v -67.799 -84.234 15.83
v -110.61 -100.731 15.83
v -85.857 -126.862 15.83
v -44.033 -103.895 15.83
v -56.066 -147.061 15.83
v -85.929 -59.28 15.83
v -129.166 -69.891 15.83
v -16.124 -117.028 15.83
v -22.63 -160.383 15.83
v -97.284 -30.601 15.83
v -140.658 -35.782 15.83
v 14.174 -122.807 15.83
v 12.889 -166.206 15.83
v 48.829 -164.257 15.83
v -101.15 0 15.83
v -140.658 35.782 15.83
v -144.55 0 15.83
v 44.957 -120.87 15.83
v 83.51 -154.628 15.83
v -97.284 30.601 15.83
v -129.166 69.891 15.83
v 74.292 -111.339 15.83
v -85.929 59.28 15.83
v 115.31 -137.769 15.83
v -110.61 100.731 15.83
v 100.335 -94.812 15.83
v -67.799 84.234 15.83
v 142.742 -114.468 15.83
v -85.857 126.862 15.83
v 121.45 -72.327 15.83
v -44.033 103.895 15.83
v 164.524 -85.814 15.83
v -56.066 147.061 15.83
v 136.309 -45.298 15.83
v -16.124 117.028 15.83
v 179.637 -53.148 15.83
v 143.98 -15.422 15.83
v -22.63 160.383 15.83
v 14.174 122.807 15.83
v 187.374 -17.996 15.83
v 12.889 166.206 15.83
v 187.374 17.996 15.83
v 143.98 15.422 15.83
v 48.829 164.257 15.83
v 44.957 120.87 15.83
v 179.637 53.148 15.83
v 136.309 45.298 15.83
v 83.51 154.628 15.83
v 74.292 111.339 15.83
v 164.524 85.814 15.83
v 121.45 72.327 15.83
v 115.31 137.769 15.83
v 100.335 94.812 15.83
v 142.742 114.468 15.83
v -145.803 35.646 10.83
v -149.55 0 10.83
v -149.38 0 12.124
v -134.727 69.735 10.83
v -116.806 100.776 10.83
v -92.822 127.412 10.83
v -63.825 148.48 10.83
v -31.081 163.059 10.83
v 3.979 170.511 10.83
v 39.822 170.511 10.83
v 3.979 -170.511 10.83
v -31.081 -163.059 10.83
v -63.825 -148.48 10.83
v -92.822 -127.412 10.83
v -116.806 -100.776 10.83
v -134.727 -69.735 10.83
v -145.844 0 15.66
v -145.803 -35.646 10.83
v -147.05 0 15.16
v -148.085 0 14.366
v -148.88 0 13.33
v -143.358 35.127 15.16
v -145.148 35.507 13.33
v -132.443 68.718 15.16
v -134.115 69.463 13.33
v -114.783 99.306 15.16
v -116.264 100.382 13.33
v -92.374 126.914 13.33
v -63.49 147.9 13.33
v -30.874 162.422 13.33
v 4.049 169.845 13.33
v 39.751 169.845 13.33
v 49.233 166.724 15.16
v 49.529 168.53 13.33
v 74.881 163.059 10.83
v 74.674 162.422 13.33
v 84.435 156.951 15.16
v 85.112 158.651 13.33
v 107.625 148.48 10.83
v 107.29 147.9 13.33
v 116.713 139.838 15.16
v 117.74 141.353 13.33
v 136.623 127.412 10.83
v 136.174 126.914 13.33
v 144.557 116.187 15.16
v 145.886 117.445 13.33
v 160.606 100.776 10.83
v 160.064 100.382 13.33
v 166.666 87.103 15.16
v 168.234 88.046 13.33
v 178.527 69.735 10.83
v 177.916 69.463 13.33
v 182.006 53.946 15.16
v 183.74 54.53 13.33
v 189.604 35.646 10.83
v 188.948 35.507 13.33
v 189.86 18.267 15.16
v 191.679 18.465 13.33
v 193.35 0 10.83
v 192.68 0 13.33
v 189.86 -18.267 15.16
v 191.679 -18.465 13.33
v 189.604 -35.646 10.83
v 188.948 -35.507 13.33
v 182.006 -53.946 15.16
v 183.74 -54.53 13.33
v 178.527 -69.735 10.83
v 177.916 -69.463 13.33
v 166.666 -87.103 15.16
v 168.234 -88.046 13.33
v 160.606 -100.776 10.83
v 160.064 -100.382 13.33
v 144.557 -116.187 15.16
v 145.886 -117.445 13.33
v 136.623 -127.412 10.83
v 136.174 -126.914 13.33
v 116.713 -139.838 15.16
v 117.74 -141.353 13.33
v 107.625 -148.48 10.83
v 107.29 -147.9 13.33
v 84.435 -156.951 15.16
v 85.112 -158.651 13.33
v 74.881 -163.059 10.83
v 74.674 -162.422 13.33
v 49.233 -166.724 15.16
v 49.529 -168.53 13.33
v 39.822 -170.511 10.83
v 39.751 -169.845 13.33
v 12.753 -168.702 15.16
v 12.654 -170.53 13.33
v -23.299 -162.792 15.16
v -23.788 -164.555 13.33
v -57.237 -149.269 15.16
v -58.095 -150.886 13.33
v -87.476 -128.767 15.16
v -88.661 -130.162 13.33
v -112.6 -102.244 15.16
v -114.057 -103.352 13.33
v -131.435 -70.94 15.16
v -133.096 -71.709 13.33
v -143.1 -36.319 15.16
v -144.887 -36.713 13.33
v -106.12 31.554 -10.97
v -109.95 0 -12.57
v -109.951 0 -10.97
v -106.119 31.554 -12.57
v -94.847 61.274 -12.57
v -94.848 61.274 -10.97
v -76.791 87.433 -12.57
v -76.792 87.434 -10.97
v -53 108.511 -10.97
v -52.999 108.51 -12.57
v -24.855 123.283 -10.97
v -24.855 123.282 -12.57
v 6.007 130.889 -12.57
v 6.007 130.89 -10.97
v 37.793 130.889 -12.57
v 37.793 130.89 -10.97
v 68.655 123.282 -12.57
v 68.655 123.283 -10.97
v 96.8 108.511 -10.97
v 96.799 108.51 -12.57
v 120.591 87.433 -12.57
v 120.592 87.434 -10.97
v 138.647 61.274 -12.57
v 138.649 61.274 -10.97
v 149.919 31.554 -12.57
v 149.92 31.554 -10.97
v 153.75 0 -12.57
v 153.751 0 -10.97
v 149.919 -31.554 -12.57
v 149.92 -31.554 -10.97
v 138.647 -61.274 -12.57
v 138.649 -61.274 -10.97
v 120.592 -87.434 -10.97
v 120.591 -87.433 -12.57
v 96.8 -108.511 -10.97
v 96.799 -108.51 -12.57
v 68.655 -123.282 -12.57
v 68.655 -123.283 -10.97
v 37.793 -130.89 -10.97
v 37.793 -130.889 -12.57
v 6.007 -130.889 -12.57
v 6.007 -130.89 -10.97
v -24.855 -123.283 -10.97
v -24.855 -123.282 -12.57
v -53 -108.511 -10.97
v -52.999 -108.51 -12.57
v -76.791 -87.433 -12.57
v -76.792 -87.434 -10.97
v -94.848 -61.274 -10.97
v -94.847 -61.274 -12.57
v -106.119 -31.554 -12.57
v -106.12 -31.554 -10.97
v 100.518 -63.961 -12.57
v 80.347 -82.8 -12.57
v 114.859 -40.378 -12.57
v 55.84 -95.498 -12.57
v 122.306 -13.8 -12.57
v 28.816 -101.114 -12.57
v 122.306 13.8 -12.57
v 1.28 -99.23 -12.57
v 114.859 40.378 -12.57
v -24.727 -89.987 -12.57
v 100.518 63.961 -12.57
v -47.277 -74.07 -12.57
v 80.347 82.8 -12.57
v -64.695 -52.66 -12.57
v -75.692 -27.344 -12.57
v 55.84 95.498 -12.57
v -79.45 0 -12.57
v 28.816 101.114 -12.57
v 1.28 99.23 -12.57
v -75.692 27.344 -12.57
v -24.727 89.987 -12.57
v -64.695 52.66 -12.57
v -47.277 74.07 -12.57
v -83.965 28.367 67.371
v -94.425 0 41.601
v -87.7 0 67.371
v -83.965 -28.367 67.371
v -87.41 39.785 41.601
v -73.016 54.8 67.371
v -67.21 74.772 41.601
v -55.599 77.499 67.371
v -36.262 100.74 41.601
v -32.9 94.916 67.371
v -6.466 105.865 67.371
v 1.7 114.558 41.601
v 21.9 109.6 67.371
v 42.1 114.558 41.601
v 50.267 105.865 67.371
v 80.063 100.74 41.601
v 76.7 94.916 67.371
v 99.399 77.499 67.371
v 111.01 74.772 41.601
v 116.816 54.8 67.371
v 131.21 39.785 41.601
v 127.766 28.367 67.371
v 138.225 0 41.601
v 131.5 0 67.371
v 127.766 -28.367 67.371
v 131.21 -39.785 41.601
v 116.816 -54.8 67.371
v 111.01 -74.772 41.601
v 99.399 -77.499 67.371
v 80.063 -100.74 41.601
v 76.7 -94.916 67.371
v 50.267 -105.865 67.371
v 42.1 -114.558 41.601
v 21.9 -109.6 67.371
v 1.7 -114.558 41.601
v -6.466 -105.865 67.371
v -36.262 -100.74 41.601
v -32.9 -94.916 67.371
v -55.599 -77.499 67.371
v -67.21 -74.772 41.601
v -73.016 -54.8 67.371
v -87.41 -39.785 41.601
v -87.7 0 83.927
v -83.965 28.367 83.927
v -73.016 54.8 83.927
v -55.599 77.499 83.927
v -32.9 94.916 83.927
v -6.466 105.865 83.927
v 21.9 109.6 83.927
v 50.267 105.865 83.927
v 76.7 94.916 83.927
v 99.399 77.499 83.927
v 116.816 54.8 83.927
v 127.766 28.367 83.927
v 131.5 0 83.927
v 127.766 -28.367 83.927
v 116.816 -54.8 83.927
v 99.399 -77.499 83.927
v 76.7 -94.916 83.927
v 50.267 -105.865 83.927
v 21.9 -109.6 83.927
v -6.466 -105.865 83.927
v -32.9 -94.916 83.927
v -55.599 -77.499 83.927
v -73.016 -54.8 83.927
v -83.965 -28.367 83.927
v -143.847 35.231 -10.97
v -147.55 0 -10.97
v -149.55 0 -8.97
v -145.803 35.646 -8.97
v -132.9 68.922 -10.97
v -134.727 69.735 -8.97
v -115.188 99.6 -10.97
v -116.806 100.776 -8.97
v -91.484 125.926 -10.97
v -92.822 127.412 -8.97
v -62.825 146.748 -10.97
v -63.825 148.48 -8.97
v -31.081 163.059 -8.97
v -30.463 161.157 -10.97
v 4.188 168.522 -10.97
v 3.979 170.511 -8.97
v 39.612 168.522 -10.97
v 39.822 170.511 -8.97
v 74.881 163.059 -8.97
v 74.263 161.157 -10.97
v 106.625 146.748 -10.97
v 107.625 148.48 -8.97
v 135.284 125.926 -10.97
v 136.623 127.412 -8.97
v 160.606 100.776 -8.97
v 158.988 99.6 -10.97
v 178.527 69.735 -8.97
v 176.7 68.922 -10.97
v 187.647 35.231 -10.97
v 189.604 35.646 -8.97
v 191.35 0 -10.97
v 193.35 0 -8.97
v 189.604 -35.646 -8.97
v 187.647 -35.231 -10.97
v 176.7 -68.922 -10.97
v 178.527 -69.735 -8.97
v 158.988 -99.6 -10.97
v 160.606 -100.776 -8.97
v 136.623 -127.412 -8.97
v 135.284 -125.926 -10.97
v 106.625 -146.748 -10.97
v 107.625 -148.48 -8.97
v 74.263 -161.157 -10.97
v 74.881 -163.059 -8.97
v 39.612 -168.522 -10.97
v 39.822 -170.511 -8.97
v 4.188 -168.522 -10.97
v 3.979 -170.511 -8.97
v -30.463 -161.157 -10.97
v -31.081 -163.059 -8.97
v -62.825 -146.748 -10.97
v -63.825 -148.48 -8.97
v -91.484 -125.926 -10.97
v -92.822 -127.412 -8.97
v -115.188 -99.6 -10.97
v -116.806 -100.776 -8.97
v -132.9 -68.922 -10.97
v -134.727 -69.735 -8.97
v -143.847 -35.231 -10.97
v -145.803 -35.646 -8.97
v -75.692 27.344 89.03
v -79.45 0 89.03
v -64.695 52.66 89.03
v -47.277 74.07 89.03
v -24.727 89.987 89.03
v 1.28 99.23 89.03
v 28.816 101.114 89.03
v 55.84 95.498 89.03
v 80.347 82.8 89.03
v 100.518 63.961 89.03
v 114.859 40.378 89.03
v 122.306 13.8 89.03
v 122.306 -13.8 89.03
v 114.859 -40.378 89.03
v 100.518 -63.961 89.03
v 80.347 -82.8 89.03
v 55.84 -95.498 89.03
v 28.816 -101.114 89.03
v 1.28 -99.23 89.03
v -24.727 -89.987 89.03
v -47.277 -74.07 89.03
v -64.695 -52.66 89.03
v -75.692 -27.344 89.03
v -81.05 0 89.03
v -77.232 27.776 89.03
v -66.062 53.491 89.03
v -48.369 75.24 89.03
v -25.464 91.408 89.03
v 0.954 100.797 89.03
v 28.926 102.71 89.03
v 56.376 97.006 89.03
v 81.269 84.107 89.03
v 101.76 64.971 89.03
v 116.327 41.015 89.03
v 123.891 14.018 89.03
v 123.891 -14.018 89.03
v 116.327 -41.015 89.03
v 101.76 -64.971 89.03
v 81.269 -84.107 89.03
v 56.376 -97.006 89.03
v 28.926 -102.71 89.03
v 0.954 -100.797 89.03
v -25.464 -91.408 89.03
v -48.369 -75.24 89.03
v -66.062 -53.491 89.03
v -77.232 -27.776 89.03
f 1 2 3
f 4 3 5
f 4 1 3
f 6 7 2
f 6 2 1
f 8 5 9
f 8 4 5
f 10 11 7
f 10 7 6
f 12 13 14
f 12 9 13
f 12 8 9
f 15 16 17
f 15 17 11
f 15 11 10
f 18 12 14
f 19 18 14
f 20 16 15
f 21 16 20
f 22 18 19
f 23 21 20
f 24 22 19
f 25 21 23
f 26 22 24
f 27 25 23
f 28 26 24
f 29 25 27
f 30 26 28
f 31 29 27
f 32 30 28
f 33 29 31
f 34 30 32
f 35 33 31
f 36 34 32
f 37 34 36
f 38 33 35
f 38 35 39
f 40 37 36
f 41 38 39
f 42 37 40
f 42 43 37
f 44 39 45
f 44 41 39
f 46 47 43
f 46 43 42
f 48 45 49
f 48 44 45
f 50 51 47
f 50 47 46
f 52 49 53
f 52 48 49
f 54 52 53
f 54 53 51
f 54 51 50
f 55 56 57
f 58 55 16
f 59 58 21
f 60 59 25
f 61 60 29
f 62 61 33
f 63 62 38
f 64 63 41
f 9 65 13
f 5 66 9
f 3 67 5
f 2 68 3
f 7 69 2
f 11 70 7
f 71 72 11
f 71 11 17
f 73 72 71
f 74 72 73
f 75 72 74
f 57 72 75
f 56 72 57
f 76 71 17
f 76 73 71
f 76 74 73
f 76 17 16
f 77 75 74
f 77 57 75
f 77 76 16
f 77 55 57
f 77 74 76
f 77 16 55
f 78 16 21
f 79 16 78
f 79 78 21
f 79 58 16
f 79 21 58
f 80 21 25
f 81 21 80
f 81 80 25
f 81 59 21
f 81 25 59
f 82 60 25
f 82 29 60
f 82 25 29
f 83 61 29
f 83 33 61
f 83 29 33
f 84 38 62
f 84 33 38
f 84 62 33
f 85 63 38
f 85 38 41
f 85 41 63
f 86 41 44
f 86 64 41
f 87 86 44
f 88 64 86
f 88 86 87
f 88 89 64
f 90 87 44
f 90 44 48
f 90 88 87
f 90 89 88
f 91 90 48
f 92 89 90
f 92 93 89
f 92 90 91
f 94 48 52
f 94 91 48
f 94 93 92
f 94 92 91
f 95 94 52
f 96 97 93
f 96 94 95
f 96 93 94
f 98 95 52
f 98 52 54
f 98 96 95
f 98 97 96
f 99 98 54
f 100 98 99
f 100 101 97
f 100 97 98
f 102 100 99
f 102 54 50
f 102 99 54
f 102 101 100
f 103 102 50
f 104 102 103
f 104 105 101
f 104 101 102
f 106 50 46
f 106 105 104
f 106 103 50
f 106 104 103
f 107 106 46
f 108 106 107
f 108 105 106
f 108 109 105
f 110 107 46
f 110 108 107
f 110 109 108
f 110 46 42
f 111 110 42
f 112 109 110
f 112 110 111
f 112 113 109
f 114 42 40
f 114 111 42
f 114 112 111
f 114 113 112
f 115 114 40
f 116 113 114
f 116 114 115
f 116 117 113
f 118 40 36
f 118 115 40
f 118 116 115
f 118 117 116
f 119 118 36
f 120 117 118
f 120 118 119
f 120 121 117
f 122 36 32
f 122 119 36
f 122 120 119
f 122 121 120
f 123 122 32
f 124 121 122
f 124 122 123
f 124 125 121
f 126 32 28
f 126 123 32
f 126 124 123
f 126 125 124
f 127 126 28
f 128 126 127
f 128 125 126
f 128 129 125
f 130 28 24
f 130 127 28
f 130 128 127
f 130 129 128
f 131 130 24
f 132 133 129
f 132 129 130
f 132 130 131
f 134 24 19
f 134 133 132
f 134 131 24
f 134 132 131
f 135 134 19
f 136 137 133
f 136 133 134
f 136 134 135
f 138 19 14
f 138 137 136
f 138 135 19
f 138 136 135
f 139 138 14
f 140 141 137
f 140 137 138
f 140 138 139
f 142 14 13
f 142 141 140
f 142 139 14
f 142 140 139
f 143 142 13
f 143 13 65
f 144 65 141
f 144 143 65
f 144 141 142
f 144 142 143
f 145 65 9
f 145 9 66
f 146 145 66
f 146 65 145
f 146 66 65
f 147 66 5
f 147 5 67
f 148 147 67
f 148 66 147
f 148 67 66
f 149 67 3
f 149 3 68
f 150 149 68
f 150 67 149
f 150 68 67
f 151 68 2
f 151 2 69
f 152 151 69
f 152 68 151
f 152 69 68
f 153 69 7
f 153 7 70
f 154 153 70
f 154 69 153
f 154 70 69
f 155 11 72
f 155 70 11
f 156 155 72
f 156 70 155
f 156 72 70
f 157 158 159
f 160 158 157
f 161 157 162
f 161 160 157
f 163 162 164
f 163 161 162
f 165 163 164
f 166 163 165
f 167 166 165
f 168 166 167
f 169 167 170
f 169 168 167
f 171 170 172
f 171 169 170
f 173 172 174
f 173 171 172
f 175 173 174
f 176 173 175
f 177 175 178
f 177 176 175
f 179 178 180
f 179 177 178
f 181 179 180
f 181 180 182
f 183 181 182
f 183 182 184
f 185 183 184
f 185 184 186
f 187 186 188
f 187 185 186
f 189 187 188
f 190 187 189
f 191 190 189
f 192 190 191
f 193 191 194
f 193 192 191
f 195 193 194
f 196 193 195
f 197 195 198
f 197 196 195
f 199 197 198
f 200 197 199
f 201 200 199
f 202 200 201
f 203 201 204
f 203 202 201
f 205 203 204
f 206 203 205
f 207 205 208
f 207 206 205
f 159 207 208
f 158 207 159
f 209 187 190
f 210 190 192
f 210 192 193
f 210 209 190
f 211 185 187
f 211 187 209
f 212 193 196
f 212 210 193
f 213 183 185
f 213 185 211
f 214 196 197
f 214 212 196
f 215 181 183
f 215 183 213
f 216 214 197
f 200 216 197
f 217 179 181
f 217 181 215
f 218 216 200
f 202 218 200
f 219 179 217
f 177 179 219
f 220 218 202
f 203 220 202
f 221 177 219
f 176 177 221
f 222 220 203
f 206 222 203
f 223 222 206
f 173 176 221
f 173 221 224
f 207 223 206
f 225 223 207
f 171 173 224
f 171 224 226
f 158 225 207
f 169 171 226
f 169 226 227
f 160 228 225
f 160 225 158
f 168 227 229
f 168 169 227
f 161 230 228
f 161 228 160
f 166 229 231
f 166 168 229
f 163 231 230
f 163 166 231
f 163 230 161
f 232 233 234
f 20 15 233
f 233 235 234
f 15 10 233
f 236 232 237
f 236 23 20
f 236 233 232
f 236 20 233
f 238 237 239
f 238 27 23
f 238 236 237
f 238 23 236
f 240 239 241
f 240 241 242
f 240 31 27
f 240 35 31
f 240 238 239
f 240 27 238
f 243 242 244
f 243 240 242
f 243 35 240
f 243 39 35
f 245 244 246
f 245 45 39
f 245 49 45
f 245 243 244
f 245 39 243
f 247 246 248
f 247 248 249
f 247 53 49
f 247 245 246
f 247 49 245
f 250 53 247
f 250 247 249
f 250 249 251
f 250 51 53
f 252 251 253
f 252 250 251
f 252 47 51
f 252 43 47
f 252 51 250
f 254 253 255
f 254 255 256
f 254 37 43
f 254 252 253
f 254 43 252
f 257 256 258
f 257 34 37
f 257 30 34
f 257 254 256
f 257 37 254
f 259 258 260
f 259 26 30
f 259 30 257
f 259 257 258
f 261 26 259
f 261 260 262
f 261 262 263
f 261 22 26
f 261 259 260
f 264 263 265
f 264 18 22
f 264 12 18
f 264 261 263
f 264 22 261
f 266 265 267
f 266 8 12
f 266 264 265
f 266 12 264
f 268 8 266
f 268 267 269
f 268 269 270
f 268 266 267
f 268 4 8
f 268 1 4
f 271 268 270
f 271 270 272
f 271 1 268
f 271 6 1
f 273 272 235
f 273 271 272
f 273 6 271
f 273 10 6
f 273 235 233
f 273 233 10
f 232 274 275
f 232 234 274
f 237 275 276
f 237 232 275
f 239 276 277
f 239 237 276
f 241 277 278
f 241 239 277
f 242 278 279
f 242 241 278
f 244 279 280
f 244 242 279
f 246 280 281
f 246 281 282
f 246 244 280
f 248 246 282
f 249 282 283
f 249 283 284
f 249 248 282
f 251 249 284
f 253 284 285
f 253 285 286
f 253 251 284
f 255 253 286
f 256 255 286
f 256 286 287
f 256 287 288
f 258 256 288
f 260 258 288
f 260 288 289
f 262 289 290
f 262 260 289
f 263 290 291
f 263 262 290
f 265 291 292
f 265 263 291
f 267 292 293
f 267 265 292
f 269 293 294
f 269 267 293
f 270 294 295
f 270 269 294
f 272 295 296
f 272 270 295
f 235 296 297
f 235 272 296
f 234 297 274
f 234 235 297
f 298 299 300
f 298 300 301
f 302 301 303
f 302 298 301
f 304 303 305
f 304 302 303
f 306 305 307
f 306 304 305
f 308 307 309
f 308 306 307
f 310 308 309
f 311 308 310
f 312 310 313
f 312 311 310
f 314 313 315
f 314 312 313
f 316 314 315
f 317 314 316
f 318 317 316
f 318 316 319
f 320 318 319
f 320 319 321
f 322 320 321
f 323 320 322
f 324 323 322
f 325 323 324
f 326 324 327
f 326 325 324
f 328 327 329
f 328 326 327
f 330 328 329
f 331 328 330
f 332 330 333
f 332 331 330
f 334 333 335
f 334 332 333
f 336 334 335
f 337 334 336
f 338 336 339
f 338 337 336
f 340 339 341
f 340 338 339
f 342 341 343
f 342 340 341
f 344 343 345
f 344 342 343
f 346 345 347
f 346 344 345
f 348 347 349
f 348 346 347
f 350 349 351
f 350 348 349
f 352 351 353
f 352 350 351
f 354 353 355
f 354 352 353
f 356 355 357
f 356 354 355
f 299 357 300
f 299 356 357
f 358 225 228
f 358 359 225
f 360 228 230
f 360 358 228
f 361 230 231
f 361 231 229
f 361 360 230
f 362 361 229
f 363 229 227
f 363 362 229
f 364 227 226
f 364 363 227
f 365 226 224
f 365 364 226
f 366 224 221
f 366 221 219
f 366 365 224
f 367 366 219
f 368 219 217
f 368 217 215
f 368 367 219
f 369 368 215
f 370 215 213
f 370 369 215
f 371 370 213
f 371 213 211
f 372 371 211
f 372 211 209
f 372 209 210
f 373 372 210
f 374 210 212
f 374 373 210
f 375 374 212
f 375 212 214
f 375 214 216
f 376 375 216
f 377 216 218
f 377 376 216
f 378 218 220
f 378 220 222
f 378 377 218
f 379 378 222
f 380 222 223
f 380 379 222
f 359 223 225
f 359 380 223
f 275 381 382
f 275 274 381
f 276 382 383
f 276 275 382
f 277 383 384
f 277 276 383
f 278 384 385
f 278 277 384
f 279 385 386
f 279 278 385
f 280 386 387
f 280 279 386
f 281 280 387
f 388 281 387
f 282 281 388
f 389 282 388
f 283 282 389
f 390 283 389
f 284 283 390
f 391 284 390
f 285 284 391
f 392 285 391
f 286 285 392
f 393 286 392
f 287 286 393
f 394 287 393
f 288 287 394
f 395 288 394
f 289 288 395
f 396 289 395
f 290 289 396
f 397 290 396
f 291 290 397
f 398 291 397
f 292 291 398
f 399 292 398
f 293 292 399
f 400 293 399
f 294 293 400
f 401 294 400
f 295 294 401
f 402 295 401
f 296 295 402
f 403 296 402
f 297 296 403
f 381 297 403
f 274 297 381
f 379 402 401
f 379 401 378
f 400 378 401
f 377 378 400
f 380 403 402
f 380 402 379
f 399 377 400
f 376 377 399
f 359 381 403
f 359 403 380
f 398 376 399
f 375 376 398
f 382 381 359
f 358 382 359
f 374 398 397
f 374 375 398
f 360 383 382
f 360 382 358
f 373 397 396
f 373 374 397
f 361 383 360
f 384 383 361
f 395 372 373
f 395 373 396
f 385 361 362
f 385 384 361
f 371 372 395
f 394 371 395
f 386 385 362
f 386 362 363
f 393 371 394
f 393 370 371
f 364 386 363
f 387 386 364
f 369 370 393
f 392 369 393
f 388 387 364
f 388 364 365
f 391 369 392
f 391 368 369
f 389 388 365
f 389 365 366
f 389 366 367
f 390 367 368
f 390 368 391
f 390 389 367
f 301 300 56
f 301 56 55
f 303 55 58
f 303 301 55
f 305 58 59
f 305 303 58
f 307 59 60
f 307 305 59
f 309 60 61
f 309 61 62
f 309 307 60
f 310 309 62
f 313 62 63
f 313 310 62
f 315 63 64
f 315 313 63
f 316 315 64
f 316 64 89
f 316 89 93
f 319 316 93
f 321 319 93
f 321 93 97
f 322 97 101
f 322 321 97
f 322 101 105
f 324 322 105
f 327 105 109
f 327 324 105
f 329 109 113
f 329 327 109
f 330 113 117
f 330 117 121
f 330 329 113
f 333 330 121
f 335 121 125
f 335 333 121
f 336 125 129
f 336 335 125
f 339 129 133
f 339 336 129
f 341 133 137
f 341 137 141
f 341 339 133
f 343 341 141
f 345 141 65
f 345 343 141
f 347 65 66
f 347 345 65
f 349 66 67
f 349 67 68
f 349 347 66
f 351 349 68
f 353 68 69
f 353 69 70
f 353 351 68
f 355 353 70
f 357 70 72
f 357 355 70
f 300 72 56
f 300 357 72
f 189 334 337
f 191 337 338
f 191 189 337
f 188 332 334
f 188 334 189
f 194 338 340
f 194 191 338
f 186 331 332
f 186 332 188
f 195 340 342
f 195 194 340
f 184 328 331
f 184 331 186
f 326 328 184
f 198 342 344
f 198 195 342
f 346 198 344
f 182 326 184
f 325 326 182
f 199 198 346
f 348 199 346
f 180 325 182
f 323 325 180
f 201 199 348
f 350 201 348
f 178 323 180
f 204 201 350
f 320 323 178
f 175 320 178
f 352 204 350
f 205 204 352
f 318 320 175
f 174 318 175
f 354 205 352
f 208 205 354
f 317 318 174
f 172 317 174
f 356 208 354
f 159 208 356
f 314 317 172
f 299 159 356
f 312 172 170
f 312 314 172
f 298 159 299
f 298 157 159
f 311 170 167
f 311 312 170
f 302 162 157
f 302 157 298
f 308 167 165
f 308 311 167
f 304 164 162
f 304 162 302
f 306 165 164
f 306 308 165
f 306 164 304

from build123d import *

# Parameters (mm, degrees)
F2_R    = 5
F3_SIZE = 2


with BuildPart() as f1:
    # F0 (on Front) → F1 (revolve)
    with BuildSketch(Plane.XZ):
        Polygon((-79.4498865843, -12.5698290182), (-79.4498865843, 89.0301709818), (-81.0498865843, 89.0301709818), (-87.6998865843, 83.9274465117), (-87.6998865843, 67.3713907599), (-101.1498865843, 15.8301709818), (-149.5498865843, 15.8301709818), (-149.5498865843, -10.9698290182), (-109.9510937929, -10.9698290182), (-109.9498865843, -12.5698290182), align=None)
    revolve(axis=Axis((21.9001134157, 0, 0.9622275829), (0, 0, -1)))

    # F2
    f2_edges = [f1.edges().sort_by_distance(p)[0] for p in [
        (193.350113, 0, 15.830171),
    ]]
    fillet(f2_edges, radius=F2_R)

    # F3
    f3_edges = [f1.edges().sort_by_distance(p)[0] for p in [
        (193.350113, 0, -10.969829),
    ]]
    chamfer(f3_edges, length=F3_SIZE)


solid = f1.part
